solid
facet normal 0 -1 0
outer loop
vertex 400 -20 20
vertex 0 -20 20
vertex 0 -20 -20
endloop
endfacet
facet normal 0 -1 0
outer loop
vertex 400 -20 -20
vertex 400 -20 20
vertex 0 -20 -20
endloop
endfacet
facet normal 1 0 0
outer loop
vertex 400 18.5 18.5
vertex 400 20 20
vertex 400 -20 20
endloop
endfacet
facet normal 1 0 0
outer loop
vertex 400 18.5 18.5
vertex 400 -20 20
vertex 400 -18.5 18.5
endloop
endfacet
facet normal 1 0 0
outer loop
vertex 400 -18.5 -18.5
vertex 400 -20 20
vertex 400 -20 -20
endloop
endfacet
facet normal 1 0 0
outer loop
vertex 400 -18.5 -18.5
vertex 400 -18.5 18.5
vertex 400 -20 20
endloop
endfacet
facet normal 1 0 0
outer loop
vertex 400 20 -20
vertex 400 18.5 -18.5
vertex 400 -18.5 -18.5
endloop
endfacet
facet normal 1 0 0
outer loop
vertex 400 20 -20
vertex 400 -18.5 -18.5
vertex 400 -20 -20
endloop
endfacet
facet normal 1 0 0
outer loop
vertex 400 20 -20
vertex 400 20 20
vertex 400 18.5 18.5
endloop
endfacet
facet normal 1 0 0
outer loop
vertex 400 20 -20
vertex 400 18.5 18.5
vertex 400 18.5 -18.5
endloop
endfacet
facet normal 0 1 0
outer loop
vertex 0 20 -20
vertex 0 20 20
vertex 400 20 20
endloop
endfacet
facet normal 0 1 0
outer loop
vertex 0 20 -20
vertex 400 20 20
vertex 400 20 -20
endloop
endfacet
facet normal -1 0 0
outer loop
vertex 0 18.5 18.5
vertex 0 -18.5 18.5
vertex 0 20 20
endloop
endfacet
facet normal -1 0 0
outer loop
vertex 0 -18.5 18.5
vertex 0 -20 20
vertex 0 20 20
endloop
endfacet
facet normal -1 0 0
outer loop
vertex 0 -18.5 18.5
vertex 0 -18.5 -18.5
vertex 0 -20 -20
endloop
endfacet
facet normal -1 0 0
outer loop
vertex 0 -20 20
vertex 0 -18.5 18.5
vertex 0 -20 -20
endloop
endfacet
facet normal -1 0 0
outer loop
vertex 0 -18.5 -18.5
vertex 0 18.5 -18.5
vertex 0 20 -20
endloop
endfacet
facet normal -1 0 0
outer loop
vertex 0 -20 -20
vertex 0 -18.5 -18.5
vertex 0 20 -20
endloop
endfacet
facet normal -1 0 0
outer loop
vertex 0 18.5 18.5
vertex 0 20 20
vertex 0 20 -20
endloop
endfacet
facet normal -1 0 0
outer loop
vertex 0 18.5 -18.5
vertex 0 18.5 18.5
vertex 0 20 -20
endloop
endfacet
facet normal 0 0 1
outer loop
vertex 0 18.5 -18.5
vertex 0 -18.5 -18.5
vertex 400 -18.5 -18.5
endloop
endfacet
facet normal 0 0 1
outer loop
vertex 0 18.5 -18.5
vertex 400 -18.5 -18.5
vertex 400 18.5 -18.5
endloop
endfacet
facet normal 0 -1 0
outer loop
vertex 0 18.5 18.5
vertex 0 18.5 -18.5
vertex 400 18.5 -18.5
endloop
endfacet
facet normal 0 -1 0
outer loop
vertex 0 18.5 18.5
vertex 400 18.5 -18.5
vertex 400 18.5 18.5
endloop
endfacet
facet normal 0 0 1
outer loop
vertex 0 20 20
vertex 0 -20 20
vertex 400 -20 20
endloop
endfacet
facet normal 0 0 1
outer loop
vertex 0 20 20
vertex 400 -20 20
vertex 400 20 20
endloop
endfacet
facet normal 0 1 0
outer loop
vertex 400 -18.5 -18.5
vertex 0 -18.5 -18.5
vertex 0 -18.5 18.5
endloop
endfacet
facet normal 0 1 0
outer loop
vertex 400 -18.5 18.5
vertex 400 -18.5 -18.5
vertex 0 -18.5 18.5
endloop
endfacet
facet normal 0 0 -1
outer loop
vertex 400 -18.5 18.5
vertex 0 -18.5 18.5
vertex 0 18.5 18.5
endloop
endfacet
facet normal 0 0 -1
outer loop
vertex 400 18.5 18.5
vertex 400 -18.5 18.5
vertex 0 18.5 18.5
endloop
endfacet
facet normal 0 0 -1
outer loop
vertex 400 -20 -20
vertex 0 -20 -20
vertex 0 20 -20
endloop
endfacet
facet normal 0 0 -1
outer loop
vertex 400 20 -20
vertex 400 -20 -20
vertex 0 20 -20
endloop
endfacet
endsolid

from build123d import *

# Parameters (mm, degrees)
ESBO_O1_W                = 40
ESBO_O1_H                = 40
RESSALTO_EXTRUS_O1_DEPTH = 400
ESBO_O2_W                = 37
ESBO_O2_H                = 37
CORTE_EXTRUS_O1_DEPTH    = 401


with BuildPart() as part:
    # Esboço1 → Ressalto-extrusão1 (new body)
    with BuildSketch(Plane(origin=(0, 0, 0), x_dir=(0, 0, -1), z_dir=(1, 0, 0))):
        Rectangle(ESBO_O1_W, ESBO_O1_H)
    extrude(amount=RESSALTO_EXTRUS_O1_DEPTH)

    # Esboço2 → Corte-extrusão1 (cut, through all)
    with BuildSketch(Plane.ZY):
        Rectangle(ESBO_O2_W, ESBO_O2_H)
    extrude(amount=-CORTE_EXTRUS_O1_DEPTH, mode=Mode.SUBTRACT)


solid = part.part
